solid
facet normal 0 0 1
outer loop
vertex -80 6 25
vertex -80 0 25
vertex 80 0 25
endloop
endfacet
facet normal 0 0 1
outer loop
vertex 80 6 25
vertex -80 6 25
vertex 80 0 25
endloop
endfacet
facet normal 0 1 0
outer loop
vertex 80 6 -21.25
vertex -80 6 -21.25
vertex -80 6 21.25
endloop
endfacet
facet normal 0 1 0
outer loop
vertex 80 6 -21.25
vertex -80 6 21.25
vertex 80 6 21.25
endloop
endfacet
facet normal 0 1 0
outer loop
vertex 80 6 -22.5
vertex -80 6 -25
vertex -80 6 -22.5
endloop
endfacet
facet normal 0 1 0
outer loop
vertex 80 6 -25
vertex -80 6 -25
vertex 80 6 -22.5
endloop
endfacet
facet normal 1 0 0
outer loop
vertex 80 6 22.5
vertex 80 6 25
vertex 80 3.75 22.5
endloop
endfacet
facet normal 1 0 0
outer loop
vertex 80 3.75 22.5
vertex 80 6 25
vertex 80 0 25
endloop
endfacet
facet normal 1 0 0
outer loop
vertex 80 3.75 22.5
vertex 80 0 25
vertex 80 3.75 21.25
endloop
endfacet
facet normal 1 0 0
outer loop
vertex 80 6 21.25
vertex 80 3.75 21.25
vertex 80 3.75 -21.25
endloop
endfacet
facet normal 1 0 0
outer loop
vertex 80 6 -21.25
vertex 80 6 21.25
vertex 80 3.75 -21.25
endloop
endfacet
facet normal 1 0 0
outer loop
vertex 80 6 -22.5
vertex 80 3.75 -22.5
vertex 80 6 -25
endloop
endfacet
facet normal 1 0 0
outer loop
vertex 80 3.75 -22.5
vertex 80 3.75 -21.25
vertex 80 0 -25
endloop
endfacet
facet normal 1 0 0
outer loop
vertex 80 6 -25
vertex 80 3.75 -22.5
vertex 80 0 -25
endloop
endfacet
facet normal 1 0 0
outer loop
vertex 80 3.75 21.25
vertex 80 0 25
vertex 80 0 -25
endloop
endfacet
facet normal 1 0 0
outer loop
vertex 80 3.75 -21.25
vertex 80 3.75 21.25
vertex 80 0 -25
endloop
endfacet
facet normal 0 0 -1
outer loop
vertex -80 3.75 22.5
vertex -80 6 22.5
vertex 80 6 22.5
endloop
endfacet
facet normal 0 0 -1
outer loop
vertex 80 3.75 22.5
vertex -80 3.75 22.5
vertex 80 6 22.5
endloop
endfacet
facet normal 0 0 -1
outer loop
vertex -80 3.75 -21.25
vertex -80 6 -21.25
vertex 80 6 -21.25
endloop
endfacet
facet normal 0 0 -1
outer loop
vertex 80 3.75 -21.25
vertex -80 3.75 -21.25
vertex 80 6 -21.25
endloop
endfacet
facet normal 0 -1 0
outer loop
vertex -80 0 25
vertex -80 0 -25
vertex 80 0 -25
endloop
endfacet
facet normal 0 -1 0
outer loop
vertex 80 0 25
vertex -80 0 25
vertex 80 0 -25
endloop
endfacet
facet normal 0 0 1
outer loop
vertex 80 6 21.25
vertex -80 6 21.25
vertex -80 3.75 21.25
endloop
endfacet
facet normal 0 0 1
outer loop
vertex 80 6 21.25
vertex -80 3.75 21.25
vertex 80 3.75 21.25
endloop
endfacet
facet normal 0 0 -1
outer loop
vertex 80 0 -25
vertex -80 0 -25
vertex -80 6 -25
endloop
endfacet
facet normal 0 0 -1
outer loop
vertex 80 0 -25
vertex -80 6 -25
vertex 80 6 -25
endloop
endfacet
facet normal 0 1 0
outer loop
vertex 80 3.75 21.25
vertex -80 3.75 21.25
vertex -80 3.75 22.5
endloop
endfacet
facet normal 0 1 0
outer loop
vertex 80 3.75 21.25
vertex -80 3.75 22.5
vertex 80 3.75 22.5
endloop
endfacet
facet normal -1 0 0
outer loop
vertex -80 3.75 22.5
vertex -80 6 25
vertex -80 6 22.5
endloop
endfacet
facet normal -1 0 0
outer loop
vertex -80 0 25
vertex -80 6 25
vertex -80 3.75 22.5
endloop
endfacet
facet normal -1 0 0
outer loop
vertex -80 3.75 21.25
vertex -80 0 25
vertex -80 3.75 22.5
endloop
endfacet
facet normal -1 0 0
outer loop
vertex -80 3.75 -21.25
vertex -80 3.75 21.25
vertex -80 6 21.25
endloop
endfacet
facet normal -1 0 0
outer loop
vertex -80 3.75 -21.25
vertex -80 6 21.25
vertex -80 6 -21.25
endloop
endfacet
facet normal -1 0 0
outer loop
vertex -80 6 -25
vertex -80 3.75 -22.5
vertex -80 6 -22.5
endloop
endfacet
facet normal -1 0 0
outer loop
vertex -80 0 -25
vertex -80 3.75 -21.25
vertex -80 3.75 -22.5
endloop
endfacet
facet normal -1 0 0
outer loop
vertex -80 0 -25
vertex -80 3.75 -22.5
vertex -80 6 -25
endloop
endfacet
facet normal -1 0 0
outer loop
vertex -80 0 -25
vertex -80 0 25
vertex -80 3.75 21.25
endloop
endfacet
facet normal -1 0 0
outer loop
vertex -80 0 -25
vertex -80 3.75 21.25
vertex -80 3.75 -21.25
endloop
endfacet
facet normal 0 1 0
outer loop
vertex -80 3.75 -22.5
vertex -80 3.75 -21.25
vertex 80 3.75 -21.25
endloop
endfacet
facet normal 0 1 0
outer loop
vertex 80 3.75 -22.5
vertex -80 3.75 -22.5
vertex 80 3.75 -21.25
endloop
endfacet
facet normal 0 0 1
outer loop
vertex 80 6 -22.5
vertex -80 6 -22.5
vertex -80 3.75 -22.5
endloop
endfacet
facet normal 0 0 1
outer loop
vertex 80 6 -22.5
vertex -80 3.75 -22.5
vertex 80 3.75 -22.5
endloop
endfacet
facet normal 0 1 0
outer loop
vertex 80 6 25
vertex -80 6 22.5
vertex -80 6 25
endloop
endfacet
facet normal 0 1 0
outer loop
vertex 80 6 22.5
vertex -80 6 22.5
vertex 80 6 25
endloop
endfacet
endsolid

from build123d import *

# Parameters (mm, degrees)
SKETCH1_W           = 160
SKETCH1_H           = 50
BOSS_EXTRUDE1_DEPTH = 6
SKETCH3_W           = 160
SKETCH3_H           = 1.25
CUT_EXTRUDE1_DEPTH  = 2.25


with BuildPart() as part:
    # Sketch1 → Boss-Extrude1 (new body)
    with BuildSketch(Plane(origin=(0, 0, 0), x_dir=(1, 0, 0), z_dir=(0, 1, 0))):
        Rectangle(SKETCH1_W, SKETCH1_H)
    extrude(amount=BOSS_EXTRUDE1_DEPTH)

    # Sketch3 → Cut-Extrude1 (cut)
    with BuildSketch(Plane(origin=(0, 6, 0), x_dir=(1, 0, 0), z_dir=(0, 1, 0))):
        with Locations((0, -21.875)):
            Rectangle(SKETCH3_W, SKETCH3_H)
    cut_extrude1 = extrude(amount=-CUT_EXTRUDE1_DEPTH, mode=Mode.SUBTRACT)

    # Mirror1: Cut-Extrude1 across plane
    add(cut_extrude1.mirror(Plane.XY), mode=Mode.SUBTRACT)


solid = part.part
